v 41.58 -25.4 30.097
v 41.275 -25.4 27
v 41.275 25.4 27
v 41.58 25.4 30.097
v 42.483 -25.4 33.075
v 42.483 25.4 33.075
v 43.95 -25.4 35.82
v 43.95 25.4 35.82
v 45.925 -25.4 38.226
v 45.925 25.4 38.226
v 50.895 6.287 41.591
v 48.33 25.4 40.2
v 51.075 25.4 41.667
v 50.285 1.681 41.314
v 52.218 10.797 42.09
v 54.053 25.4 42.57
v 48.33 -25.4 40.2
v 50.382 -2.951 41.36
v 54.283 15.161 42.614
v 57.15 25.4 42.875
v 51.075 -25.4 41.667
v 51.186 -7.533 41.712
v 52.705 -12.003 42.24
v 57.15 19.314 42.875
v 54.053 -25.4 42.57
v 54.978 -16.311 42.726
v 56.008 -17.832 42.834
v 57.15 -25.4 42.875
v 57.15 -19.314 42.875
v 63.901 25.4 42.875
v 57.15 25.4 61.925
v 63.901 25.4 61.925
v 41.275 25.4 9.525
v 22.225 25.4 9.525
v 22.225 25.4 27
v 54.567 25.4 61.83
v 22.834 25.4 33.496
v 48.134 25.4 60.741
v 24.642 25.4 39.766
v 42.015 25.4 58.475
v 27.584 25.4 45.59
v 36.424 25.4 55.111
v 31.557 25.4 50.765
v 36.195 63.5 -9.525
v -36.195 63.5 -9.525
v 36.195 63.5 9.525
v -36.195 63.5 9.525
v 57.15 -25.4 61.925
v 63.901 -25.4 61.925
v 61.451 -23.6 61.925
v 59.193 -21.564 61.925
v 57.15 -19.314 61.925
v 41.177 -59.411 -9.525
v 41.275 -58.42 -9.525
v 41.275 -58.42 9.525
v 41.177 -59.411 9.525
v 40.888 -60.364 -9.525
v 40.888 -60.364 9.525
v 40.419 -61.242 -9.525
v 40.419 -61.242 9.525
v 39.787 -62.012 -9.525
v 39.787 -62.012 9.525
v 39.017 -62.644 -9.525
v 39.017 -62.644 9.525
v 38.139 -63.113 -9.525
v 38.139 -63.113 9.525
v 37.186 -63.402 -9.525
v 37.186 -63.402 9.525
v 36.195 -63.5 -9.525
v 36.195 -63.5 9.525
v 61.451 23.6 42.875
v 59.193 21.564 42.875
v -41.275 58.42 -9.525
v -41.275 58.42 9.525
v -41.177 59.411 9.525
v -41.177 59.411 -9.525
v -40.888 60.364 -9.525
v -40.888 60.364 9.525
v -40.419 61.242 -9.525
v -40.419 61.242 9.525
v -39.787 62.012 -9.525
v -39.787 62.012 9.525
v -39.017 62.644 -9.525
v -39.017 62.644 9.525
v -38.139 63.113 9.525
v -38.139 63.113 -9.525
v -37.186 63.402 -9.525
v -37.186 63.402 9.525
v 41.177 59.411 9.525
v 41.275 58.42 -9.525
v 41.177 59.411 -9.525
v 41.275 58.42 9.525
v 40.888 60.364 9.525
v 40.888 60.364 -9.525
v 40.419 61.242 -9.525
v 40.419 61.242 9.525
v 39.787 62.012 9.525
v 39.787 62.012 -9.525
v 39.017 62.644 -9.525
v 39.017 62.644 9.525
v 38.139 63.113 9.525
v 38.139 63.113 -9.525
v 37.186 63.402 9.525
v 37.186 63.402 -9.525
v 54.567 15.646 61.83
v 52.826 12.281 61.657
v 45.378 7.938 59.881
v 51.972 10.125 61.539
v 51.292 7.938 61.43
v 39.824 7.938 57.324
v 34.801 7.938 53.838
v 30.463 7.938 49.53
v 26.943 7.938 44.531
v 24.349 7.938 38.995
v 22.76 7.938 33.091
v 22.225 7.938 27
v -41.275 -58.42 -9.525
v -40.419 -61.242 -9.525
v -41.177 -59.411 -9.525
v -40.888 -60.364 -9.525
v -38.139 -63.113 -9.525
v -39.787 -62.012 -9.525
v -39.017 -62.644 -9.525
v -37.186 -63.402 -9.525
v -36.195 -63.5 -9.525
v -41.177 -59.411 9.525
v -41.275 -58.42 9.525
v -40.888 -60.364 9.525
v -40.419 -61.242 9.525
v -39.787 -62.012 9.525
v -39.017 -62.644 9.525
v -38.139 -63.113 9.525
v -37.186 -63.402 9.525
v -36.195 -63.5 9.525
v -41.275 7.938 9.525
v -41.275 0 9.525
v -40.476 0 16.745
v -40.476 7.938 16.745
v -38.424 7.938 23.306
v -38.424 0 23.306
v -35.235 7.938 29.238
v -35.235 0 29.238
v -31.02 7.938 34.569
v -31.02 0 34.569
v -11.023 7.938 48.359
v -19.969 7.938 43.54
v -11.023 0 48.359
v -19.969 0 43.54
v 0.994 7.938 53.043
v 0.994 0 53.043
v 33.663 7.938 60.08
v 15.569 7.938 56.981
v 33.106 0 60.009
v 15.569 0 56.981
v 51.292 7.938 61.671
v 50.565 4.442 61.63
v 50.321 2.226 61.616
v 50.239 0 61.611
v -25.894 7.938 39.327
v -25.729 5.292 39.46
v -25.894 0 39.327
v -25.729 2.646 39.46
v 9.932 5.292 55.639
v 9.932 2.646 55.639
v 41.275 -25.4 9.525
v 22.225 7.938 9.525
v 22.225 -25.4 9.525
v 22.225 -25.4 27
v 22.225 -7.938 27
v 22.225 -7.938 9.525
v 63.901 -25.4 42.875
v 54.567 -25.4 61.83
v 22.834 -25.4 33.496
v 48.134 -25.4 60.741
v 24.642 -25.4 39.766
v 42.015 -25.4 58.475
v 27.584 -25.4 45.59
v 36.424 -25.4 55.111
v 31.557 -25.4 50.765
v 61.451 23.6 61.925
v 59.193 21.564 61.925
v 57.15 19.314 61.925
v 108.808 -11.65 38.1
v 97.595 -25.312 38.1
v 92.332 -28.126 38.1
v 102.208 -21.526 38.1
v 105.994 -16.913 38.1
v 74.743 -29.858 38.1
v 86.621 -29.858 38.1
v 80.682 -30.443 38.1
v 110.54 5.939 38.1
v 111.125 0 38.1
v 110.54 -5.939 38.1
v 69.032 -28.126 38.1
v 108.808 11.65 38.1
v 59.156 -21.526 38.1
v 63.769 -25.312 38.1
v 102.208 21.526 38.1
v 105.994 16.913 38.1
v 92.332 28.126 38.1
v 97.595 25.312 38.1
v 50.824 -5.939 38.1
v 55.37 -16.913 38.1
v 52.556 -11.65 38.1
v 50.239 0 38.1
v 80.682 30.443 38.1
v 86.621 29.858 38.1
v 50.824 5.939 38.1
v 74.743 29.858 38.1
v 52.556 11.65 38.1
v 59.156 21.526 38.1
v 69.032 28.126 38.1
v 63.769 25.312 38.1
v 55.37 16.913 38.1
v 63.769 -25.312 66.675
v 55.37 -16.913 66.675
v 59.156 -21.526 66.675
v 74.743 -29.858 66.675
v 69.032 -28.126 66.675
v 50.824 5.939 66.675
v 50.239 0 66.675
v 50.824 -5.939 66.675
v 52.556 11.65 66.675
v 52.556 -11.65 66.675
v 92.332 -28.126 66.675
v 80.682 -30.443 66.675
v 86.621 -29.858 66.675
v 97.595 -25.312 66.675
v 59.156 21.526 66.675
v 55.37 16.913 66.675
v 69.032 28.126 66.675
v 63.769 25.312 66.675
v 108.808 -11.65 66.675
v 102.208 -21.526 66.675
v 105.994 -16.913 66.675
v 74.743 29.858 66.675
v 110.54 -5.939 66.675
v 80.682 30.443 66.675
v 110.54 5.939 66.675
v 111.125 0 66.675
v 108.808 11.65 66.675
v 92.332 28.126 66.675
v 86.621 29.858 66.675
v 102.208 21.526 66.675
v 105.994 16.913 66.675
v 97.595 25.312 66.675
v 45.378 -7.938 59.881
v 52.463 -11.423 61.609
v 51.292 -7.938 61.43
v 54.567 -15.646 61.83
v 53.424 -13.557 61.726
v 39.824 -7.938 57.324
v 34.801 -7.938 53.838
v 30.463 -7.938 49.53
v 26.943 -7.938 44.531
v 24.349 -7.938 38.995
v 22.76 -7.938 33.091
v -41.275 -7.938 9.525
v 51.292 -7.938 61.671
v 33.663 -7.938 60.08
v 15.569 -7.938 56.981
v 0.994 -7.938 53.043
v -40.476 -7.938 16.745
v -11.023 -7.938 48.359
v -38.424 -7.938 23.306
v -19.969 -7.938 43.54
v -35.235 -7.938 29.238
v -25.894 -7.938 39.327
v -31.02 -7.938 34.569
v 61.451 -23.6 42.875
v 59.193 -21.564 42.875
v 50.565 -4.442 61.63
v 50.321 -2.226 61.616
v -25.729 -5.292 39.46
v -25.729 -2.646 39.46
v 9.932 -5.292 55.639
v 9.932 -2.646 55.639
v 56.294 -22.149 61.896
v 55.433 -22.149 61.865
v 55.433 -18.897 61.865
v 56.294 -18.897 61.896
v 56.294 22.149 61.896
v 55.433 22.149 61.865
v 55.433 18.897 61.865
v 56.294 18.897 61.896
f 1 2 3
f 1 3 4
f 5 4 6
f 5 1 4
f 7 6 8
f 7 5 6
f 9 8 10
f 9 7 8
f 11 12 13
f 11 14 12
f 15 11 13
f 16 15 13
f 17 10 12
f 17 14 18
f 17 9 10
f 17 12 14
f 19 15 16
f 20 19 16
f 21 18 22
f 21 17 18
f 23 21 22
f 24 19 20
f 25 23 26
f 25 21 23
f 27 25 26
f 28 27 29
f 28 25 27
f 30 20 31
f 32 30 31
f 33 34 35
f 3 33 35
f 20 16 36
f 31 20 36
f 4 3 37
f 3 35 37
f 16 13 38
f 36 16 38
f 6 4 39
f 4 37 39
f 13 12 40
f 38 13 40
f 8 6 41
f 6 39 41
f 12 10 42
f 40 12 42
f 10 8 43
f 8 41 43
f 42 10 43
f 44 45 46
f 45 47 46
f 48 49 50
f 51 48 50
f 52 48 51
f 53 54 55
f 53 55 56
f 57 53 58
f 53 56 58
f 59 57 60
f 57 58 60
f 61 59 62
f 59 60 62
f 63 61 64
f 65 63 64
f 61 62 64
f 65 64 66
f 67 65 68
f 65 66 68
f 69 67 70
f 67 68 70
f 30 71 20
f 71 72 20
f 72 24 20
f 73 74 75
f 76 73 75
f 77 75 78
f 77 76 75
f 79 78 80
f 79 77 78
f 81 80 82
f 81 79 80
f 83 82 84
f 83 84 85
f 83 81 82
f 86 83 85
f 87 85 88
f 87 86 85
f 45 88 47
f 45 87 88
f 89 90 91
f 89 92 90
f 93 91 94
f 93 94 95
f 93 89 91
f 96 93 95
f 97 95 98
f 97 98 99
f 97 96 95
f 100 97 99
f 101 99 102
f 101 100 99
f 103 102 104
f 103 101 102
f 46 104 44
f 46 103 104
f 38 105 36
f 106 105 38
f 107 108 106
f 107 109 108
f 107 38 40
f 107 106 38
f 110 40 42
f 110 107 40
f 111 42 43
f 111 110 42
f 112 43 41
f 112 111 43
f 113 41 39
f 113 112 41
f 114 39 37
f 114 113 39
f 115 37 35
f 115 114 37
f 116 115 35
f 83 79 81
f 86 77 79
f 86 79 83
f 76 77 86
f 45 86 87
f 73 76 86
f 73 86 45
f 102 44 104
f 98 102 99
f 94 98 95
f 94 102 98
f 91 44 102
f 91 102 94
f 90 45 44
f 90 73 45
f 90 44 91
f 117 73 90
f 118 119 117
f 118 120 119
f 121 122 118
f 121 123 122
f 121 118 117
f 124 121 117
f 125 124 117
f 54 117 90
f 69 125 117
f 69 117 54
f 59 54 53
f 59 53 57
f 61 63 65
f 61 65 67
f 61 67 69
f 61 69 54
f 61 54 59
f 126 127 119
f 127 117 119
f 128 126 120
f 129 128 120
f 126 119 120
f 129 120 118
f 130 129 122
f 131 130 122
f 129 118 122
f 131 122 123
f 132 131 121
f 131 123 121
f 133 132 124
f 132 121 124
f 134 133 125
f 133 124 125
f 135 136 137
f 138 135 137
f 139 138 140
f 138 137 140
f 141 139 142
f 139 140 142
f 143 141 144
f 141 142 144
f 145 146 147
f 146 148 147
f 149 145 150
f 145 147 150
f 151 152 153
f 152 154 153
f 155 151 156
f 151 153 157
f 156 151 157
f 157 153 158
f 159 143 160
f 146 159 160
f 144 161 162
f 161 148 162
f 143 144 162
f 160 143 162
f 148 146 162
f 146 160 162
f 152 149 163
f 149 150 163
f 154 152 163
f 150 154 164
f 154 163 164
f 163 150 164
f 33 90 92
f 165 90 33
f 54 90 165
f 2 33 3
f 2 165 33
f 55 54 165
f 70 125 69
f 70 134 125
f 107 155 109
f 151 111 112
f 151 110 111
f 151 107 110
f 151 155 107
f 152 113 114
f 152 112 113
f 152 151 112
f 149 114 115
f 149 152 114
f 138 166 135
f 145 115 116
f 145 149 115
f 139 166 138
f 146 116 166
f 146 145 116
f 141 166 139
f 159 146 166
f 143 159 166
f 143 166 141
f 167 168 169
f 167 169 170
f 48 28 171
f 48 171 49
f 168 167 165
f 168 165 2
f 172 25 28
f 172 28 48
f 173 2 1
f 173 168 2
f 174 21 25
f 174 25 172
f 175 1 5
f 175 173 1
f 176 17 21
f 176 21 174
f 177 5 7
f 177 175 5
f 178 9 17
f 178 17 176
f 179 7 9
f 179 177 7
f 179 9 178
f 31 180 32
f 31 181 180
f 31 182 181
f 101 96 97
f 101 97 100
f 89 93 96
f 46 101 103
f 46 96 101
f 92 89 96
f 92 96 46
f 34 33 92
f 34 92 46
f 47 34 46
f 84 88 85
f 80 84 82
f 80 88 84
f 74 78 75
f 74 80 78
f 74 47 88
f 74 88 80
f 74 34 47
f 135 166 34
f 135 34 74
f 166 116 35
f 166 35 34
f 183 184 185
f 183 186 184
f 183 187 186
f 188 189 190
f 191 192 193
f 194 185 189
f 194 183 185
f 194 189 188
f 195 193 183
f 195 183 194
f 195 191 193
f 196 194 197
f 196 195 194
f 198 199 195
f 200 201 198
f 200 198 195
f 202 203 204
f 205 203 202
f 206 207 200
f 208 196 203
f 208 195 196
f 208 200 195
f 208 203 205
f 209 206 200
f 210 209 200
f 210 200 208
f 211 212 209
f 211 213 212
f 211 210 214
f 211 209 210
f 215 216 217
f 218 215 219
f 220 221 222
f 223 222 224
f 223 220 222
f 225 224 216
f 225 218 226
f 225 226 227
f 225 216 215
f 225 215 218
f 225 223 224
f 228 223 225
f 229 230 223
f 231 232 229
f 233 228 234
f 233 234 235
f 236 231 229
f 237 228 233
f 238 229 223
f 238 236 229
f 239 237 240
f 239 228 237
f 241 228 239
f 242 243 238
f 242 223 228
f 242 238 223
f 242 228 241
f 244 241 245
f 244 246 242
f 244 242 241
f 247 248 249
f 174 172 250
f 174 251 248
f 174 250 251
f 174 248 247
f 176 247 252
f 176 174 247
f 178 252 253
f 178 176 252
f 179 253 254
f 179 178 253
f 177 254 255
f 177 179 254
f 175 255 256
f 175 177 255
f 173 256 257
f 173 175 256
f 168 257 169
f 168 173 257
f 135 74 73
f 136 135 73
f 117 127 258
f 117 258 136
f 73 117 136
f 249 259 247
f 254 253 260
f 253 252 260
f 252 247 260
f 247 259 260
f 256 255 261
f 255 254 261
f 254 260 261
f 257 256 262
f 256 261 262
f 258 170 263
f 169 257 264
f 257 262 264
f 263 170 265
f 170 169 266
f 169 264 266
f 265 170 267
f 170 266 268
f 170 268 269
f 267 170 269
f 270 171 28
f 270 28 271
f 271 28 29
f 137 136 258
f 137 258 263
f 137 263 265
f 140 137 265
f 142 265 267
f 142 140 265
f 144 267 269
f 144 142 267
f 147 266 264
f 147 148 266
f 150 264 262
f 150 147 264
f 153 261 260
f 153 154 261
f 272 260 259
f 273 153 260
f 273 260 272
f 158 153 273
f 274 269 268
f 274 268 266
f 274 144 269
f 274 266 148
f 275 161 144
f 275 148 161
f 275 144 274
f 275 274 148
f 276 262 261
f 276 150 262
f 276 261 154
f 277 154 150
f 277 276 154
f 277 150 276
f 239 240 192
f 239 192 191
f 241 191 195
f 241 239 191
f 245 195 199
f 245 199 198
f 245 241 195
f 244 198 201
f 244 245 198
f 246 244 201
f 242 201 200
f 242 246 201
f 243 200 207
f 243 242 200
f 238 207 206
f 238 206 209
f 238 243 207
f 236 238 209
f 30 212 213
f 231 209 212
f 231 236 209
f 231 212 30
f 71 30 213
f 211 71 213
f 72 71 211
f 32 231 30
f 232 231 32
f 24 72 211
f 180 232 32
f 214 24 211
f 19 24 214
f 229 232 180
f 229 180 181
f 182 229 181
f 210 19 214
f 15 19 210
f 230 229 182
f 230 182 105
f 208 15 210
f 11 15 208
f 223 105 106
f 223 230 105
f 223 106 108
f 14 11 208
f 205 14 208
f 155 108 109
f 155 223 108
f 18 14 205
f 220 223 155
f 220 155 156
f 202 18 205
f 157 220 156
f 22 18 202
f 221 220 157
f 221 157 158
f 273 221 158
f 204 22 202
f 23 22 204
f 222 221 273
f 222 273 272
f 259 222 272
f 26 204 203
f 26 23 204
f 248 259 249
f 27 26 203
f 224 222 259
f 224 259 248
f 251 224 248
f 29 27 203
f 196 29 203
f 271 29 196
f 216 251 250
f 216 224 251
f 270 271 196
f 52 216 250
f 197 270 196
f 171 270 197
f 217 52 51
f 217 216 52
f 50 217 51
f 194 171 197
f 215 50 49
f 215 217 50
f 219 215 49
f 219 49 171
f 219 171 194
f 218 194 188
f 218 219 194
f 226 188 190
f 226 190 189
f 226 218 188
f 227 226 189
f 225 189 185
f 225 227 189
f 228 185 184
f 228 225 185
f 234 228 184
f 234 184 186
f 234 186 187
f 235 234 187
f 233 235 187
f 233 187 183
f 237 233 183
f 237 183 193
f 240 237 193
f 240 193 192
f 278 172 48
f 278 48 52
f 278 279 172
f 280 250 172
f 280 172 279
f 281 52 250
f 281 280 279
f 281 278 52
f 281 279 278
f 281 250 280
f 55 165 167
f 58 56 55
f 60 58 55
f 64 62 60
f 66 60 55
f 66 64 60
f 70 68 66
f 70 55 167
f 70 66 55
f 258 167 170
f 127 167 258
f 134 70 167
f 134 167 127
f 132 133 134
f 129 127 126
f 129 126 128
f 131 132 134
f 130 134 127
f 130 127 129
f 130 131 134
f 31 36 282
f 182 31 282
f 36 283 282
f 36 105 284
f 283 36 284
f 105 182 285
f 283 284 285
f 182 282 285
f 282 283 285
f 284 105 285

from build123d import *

# Parameters (mm, degrees)
F1_DEPTH  = 63.5
F2_DEPTH  = 25.4
F3_DEPTH  = 7.9375
F2_FACE_W = 50.8
F2_FACE_H = 19.05
F4_DEPTH  = 25.4
F6_R      = 5.08


with BuildPart() as f1:
    # F0 (on Front) → F1 (new body, symmetric)
    with BuildSketch(Plane.XZ):
        Polygon((22.225, 9.525), (-41.275, 9.525), (-41.275, -9.525), (41.275, -9.525), (41.275, 9.525), align=None)
    extrude(amount=F1_DEPTH, both=True)

    # F0 (on Front) → F2 (join, symmetric)
    with BuildSketch(Plane.XZ):
        with BuildLine():
            Line((22.225, 27.0002), (22.225, 9.525))
            Line((22.225, 9.525), (41.275, 9.525))
            Line((41.275, 9.525), (41.275, 27.0002))
            ThreePointArc((41.275, 27.0002), (45.92468, 38.22552), (57.15, 42.8752))
            Line((57.15, 42.8752), (60.325, 42.8752))
            Line((60.325, 42.8752), (60.325, 61.9252))
            Line((60.325, 61.9252), (57.15, 61.9252))
            add(Edge.make_bspline(
                [(54.567041, 61.829555), (55.435808, 61.866108), (56.29704, 61.897928), (57.15, 61.9252)],
                knots=[109.116845, 109.116845, 109.116845, 109.116845, 111.504536, 111.504536, 111.504536, 111.504536], degree=3))
            ThreePointArc((54.567041, 61.829555), (31.557369, 50.765151), (22.225, 27.0002))
        make_face()
    extrude(amount=F2_DEPTH, both=True)

    # F0 (on Front) → F3 (join, symmetric)
    with BuildSketch(Plane.XZ):
        with BuildLine():
            add(Edge.make_bspline(
                [(-41.275, 9.525), (-40.572758, 48.603796), (14.864627, 60.159082), (54.567041, 61.829555)],
                knots=[0, 0, 0, 0, 109.116845, 109.116845, 109.116845, 109.116845], degree=3))
            Line((-41.275, 9.525), (22.225, 9.525))
            Line((22.225, 9.525), (22.225, 27.0002))
            ThreePointArc((22.225, 27.0002), (31.557369, 50.765151), (54.567041, 61.829555))
        make_face()
    extrude(amount=F3_DEPTH, both=True)

    # F2_face (on face) → F4 (join)
    with BuildSketch(Plane(origin=(60.325, 0, 52.4002), x_dir=(0, 1, 0), z_dir=(1, 0, 0))):
        Rectangle(F2_FACE_W, F2_FACE_H)
    extrude(amount=F4_DEPTH)

    # F0 (on Front) → F5 (revolve)
    with BuildSketch(Plane.XZ):
        Polygon((80.682018, 66.675), (80.682018, 61.9252), (80.682018, 42.8752), (80.682018, 38.1), (111.125, 38.1), (111.125, 66.675), align=None)
    revolve(axis=Axis((80.682018, 0, 52.3875), (0, 0, 1)))

    # F6
    f6_edges = [f1.edges().sort_by_distance(p)[0] for p in [
        (-41.275, 63.5, 0),
        (-41.275, -63.5, 0),
        (41.275, 63.5, 0),
        (41.275, -63.5, 0),
    ]]
    fillet(f6_edges, radius=F6_R)


solid = f1.part
